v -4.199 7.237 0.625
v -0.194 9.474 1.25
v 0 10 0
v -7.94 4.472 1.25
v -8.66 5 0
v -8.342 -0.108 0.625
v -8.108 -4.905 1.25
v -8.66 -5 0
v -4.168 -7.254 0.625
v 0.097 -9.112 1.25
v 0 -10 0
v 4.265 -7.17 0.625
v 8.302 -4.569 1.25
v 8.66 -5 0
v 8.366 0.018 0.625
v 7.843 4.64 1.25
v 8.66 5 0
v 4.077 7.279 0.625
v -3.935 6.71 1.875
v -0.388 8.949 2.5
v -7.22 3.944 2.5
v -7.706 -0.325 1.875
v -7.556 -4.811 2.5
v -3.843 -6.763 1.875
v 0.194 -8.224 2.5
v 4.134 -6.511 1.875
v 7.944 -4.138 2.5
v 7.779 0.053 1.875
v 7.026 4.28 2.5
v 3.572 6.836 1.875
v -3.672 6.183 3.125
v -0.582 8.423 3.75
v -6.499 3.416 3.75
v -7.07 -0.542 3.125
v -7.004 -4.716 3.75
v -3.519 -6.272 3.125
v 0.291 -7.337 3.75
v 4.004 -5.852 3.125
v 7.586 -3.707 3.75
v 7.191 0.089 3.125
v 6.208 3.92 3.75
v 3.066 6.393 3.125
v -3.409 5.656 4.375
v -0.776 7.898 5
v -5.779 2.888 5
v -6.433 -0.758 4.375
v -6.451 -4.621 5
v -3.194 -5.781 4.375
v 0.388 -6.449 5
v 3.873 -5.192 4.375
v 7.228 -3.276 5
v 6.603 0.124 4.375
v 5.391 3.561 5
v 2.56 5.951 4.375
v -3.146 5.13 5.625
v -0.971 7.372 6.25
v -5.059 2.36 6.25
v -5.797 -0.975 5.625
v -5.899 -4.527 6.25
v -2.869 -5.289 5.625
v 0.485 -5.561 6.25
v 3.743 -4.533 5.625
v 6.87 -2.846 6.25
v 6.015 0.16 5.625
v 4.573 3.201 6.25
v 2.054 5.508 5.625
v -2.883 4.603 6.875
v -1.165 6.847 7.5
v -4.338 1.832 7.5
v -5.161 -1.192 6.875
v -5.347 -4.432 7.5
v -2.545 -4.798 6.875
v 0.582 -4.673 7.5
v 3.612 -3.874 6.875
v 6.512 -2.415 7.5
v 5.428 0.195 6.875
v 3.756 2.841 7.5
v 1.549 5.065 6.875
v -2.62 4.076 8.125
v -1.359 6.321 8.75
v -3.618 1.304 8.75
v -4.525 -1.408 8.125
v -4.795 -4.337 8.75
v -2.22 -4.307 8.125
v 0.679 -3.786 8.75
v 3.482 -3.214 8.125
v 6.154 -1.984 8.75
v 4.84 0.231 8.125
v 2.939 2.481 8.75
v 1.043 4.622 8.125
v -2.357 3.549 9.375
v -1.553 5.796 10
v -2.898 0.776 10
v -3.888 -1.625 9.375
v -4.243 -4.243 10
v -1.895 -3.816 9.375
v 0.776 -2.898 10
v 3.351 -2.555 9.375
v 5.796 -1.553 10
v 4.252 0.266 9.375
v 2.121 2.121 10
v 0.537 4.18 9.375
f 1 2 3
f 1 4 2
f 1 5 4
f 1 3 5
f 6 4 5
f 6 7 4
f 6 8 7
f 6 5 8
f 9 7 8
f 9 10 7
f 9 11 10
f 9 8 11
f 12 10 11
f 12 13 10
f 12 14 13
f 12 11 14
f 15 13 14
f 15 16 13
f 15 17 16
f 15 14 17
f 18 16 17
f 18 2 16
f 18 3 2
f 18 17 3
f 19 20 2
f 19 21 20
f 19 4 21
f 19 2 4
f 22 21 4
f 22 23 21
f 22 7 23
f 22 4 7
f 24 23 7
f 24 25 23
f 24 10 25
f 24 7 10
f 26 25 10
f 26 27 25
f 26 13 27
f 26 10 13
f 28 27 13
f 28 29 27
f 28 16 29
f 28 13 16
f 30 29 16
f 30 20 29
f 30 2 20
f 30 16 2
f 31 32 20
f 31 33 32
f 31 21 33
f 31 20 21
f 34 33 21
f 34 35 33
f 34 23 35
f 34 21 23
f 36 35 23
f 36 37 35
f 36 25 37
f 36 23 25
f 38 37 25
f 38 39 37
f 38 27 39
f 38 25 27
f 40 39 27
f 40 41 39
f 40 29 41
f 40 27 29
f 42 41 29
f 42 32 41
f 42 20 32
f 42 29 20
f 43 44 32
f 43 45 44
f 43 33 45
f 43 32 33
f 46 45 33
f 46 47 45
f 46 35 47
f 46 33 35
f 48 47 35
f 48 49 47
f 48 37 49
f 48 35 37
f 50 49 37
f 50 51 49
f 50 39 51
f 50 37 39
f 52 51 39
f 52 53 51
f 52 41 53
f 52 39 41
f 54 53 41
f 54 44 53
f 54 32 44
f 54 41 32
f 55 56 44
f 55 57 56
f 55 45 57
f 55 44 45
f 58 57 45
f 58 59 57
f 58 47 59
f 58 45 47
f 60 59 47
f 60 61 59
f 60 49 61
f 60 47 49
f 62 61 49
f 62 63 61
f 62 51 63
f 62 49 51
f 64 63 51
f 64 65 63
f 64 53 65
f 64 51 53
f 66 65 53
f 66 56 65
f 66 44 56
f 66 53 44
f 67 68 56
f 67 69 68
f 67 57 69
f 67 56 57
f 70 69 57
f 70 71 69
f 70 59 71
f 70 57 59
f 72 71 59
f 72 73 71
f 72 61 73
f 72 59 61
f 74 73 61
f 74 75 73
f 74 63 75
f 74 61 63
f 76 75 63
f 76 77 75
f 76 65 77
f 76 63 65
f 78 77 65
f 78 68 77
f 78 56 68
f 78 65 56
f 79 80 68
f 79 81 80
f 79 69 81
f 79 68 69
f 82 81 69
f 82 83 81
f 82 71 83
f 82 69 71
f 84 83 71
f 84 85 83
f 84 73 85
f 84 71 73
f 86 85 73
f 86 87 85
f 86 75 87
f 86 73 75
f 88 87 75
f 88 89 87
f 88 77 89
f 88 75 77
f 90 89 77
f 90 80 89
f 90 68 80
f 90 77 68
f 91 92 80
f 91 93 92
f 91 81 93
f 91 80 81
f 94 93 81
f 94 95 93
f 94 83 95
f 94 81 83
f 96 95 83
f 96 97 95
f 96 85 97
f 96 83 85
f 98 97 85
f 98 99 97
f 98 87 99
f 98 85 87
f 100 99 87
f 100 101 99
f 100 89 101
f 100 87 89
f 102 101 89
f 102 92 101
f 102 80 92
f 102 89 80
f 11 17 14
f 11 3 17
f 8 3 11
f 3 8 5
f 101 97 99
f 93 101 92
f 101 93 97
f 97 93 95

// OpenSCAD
// file: ../pcurve.scad
// Parametrize a star-convex curve by t=theta/360.
// The first point in the polygon becomes t=0.
function polar_parametrize(points,center=[0,0]) =
	let (p0=points[0], a0=atan2(p0[1]-center[1],p0[0]-center[0]))
	[ for (p=concat(points,[p0]))
	[ (atan2(p[1]-center[1],p[0]-center[0])-a0+720)%360/360, p ] ];

// Measure [partial] perimeter of polygon, through first n edges.
function perimeter(points,n=undef) =
	is_undef(n) ? perimeter(points,len(points)) :
	n==0 ? 0 :
	perimeter(points,n-1) + norm(points[n==len(points)?0:n]-points[n-1]);

// Parametrize an arbitrary curve by fraction of perimeter.
function length_parametrize(points) =
	let (total=perimeter(points)) [
	for (i=[0:1:len(points)-1]) [ perimeter(points,i)/total, points[i] ],
	[1, points[0]]];

// Parametrize an arbitrary curve by point index.
function indexed_parametrize(points,center=[0,0]) = [
	for (i=[0:1:len(points)-1]) [ i/len(points), points[i] ] ];

// Transform a parametrized curve in 2- or 3-space via an affine transformation
// matrix. Produces a parametrized curve in 3-space.
function transform_curve(M,c) = [ for (p=c) [ p[0],
	[[1,0,0,0],[0,1,0,0],[0,0,1,0]]*M*[p[1][0],p[1][1],is_undef(p[1][2])?0:p[1][2],1]
	] ];

// Produce a non-parametrized regular n-gon with first vertex on y axis.
function regular_ngon(n,r) = [ for (i=[0:1:n-1]) [-r*sin(360*i/n),r*cos(360*i/n),0] ];


// Matrix for rotation around an axis. Default is z-axis. If first argument
// is a vector, elements are sequential rotations around each axis.
function R(a,v=[0,0,1]) =
	!is_num(a) ? R(a[0],[1,0,0])*R(a[1],[0,1,0])*R(a[2],[0,0,1]) :
	let (id=[[1,0,0,0],[0,1,0,0],[0,0,1,0],[0,0,0,1]],
	vcross=[[0,-v[2],v[1],0],[v[2],0,-v[0],0],[-v[1],v[0],0,0], [0,0,0,0]],
	vouter=[for (i=[0:2]) [for (j=[0:2]) v[i]*v[j],0], [0,0,0,1]])
	cos(a)*id + sin(a)*vcross + (1-cos(a))*vouter;

// Matrix for translation. Scalars are along the z axis.
function T(v=[0,0,0]) = is_num(v) ? T([0,0,v]) :
	[[1,0,0,v[0]],[0,1,0,v[1]],[0,0,1,v[2]],[0,0,0,1]];

// Matrix for scaling (dilation). Scalar applies same to each axis;
// vector scales each axis separately.
function S(k=1) = is_num(k) ? S([k,k,k]) :
	[[k[0],0,0,0],[0,k[1],0,0],[0,0,k[2],0],[0,0,0,1]];
// file: ../loft.scad
// Sort a list of numbers.
function qsort(l) = len(l)<=1 ? l : concat(
	qsort([ for (x=l) if (x<l[0]) x ]),
	[ for (x=l) if (x==l[0]) x ],
	qsort([ for (x=l) if (x>l[0]) x]));

// Collapse runs of duplicates from a list.
function uniq(l) = [ l[0], for (i=[1:1:len(l)-1]) if (l[i]!=l[i-1]) l[i] ];

// Project on the i'th axis so lookup() can be used.
function curve_prj(c,i) = [ for (v=c) [v[0],v[1][i]] ];

// Establish periodicity of lookup() by extending to <=0 and >=1 as needed.
function curve_extend(c) = [
	if (c[0][0]>0) [c[len(c)-1][0]-1,c[len(c)-1][1]],
	for (p=c) p,
	if (c[len(c)-1][0]<1) [c[0][0]+1,c[0][1]] ];

// Evaluate curve at parameter t using lookup() to interpolate.
function curve_pt(c,t) = let(
	a=curve_extend(c))
	[ lookup(t,curve_prj(a,0)), lookup(t,curve_prj(a,1)), lookup(t,curve_prj(a,2)) ];

// Interpolate parametric curves to produce a new parametric curve.
function curve_morph(c1,c2,s) =
	let(partition = uniq(qsort([ 0, for (c=[c1,c2], p=c) p[0], 1 ])))
	[ for (t=partition) [ t,(1-s)*curve_pt(c1,t) + s*curve_pt(c2,t) ] ];

// Internal core function for loft operation.
module loft_core(curves,cap_start=false,cap_end=false) {
	partition = uniq(qsort([ for (c=curves, v=c) v[0], 1 ]));
	m = len(curves);
	n = len(partition);
	edge_points = [ for (c=curves, t=partition) curve_pt(c,t) ];
	center_points = [ for (k=[0:len(curves)-1], j=[0:1:n-2])
		(edge_points[n*k+j] + edge_points[n*(k+1)+j+1] +
		 edge_points[n*(k+1)+j] + edge_points[n*k+j+1])/4 ];
	points = [ for (p=edge_points) p, for (p=center_points) p ];
	c0 = len(edge_points);
	faces = [
		for (k=[0:1:len(curves)-2], j=[0:n-2],
			v=[ [k*n+j, (k+1)*n+j, c0+k*(n-1)+j],
			    [(k+1)*n+j, (k+1)*n+j+1, c0+k*(n-1)+j],
			    [(k+1)*n+j+1, k*n+j+1, c0+k*(n-1)+j],
			    [k*n+j+1, k*n+j, c0+k*(n-1)+j] ]) v,
		if (cap_start) [ for (j=[0:1:n-2]) j ],
		if (cap_end) [ for (j=[n-2:-1:0]) n*(m-1)+j ],
	];
	polyhedron(points=points,faces=faces,convexity=20);
}

// Produce a polyhedron-type object by applying a loft operation to
// a list of parametric curves, linking points in successive curves with
// the same value of the parameter. If the first or last curve is planar,
// it can be made into an end-cap surface by putting an empty curve []
// before or after it. Otherwise, either the first and last curves must
// be the same, producing a loop, or they must be degenerate (single points).
module loft(curves) {
	loft_core(
		curves = [for (c=curves) if (len(c)>0) c],
		cap_start = len(curves[0])==0,
		cap_end = len(curves[len(curves)-1])==0
	);
}
// main file
use <../loft.scad>;
use <../pcurve.scad>;


loft([
	[],
	for (s=[0:1/8:1]) curve_morph(
		transform_curve(T(),length_parametrize(regular_ngon(n=6,r=10))),
		transform_curve(T(10)*R(15,[0,0,1]),length_parametrize(regular_ngon(n=3,r=6))),
		s),
	[],
]);
